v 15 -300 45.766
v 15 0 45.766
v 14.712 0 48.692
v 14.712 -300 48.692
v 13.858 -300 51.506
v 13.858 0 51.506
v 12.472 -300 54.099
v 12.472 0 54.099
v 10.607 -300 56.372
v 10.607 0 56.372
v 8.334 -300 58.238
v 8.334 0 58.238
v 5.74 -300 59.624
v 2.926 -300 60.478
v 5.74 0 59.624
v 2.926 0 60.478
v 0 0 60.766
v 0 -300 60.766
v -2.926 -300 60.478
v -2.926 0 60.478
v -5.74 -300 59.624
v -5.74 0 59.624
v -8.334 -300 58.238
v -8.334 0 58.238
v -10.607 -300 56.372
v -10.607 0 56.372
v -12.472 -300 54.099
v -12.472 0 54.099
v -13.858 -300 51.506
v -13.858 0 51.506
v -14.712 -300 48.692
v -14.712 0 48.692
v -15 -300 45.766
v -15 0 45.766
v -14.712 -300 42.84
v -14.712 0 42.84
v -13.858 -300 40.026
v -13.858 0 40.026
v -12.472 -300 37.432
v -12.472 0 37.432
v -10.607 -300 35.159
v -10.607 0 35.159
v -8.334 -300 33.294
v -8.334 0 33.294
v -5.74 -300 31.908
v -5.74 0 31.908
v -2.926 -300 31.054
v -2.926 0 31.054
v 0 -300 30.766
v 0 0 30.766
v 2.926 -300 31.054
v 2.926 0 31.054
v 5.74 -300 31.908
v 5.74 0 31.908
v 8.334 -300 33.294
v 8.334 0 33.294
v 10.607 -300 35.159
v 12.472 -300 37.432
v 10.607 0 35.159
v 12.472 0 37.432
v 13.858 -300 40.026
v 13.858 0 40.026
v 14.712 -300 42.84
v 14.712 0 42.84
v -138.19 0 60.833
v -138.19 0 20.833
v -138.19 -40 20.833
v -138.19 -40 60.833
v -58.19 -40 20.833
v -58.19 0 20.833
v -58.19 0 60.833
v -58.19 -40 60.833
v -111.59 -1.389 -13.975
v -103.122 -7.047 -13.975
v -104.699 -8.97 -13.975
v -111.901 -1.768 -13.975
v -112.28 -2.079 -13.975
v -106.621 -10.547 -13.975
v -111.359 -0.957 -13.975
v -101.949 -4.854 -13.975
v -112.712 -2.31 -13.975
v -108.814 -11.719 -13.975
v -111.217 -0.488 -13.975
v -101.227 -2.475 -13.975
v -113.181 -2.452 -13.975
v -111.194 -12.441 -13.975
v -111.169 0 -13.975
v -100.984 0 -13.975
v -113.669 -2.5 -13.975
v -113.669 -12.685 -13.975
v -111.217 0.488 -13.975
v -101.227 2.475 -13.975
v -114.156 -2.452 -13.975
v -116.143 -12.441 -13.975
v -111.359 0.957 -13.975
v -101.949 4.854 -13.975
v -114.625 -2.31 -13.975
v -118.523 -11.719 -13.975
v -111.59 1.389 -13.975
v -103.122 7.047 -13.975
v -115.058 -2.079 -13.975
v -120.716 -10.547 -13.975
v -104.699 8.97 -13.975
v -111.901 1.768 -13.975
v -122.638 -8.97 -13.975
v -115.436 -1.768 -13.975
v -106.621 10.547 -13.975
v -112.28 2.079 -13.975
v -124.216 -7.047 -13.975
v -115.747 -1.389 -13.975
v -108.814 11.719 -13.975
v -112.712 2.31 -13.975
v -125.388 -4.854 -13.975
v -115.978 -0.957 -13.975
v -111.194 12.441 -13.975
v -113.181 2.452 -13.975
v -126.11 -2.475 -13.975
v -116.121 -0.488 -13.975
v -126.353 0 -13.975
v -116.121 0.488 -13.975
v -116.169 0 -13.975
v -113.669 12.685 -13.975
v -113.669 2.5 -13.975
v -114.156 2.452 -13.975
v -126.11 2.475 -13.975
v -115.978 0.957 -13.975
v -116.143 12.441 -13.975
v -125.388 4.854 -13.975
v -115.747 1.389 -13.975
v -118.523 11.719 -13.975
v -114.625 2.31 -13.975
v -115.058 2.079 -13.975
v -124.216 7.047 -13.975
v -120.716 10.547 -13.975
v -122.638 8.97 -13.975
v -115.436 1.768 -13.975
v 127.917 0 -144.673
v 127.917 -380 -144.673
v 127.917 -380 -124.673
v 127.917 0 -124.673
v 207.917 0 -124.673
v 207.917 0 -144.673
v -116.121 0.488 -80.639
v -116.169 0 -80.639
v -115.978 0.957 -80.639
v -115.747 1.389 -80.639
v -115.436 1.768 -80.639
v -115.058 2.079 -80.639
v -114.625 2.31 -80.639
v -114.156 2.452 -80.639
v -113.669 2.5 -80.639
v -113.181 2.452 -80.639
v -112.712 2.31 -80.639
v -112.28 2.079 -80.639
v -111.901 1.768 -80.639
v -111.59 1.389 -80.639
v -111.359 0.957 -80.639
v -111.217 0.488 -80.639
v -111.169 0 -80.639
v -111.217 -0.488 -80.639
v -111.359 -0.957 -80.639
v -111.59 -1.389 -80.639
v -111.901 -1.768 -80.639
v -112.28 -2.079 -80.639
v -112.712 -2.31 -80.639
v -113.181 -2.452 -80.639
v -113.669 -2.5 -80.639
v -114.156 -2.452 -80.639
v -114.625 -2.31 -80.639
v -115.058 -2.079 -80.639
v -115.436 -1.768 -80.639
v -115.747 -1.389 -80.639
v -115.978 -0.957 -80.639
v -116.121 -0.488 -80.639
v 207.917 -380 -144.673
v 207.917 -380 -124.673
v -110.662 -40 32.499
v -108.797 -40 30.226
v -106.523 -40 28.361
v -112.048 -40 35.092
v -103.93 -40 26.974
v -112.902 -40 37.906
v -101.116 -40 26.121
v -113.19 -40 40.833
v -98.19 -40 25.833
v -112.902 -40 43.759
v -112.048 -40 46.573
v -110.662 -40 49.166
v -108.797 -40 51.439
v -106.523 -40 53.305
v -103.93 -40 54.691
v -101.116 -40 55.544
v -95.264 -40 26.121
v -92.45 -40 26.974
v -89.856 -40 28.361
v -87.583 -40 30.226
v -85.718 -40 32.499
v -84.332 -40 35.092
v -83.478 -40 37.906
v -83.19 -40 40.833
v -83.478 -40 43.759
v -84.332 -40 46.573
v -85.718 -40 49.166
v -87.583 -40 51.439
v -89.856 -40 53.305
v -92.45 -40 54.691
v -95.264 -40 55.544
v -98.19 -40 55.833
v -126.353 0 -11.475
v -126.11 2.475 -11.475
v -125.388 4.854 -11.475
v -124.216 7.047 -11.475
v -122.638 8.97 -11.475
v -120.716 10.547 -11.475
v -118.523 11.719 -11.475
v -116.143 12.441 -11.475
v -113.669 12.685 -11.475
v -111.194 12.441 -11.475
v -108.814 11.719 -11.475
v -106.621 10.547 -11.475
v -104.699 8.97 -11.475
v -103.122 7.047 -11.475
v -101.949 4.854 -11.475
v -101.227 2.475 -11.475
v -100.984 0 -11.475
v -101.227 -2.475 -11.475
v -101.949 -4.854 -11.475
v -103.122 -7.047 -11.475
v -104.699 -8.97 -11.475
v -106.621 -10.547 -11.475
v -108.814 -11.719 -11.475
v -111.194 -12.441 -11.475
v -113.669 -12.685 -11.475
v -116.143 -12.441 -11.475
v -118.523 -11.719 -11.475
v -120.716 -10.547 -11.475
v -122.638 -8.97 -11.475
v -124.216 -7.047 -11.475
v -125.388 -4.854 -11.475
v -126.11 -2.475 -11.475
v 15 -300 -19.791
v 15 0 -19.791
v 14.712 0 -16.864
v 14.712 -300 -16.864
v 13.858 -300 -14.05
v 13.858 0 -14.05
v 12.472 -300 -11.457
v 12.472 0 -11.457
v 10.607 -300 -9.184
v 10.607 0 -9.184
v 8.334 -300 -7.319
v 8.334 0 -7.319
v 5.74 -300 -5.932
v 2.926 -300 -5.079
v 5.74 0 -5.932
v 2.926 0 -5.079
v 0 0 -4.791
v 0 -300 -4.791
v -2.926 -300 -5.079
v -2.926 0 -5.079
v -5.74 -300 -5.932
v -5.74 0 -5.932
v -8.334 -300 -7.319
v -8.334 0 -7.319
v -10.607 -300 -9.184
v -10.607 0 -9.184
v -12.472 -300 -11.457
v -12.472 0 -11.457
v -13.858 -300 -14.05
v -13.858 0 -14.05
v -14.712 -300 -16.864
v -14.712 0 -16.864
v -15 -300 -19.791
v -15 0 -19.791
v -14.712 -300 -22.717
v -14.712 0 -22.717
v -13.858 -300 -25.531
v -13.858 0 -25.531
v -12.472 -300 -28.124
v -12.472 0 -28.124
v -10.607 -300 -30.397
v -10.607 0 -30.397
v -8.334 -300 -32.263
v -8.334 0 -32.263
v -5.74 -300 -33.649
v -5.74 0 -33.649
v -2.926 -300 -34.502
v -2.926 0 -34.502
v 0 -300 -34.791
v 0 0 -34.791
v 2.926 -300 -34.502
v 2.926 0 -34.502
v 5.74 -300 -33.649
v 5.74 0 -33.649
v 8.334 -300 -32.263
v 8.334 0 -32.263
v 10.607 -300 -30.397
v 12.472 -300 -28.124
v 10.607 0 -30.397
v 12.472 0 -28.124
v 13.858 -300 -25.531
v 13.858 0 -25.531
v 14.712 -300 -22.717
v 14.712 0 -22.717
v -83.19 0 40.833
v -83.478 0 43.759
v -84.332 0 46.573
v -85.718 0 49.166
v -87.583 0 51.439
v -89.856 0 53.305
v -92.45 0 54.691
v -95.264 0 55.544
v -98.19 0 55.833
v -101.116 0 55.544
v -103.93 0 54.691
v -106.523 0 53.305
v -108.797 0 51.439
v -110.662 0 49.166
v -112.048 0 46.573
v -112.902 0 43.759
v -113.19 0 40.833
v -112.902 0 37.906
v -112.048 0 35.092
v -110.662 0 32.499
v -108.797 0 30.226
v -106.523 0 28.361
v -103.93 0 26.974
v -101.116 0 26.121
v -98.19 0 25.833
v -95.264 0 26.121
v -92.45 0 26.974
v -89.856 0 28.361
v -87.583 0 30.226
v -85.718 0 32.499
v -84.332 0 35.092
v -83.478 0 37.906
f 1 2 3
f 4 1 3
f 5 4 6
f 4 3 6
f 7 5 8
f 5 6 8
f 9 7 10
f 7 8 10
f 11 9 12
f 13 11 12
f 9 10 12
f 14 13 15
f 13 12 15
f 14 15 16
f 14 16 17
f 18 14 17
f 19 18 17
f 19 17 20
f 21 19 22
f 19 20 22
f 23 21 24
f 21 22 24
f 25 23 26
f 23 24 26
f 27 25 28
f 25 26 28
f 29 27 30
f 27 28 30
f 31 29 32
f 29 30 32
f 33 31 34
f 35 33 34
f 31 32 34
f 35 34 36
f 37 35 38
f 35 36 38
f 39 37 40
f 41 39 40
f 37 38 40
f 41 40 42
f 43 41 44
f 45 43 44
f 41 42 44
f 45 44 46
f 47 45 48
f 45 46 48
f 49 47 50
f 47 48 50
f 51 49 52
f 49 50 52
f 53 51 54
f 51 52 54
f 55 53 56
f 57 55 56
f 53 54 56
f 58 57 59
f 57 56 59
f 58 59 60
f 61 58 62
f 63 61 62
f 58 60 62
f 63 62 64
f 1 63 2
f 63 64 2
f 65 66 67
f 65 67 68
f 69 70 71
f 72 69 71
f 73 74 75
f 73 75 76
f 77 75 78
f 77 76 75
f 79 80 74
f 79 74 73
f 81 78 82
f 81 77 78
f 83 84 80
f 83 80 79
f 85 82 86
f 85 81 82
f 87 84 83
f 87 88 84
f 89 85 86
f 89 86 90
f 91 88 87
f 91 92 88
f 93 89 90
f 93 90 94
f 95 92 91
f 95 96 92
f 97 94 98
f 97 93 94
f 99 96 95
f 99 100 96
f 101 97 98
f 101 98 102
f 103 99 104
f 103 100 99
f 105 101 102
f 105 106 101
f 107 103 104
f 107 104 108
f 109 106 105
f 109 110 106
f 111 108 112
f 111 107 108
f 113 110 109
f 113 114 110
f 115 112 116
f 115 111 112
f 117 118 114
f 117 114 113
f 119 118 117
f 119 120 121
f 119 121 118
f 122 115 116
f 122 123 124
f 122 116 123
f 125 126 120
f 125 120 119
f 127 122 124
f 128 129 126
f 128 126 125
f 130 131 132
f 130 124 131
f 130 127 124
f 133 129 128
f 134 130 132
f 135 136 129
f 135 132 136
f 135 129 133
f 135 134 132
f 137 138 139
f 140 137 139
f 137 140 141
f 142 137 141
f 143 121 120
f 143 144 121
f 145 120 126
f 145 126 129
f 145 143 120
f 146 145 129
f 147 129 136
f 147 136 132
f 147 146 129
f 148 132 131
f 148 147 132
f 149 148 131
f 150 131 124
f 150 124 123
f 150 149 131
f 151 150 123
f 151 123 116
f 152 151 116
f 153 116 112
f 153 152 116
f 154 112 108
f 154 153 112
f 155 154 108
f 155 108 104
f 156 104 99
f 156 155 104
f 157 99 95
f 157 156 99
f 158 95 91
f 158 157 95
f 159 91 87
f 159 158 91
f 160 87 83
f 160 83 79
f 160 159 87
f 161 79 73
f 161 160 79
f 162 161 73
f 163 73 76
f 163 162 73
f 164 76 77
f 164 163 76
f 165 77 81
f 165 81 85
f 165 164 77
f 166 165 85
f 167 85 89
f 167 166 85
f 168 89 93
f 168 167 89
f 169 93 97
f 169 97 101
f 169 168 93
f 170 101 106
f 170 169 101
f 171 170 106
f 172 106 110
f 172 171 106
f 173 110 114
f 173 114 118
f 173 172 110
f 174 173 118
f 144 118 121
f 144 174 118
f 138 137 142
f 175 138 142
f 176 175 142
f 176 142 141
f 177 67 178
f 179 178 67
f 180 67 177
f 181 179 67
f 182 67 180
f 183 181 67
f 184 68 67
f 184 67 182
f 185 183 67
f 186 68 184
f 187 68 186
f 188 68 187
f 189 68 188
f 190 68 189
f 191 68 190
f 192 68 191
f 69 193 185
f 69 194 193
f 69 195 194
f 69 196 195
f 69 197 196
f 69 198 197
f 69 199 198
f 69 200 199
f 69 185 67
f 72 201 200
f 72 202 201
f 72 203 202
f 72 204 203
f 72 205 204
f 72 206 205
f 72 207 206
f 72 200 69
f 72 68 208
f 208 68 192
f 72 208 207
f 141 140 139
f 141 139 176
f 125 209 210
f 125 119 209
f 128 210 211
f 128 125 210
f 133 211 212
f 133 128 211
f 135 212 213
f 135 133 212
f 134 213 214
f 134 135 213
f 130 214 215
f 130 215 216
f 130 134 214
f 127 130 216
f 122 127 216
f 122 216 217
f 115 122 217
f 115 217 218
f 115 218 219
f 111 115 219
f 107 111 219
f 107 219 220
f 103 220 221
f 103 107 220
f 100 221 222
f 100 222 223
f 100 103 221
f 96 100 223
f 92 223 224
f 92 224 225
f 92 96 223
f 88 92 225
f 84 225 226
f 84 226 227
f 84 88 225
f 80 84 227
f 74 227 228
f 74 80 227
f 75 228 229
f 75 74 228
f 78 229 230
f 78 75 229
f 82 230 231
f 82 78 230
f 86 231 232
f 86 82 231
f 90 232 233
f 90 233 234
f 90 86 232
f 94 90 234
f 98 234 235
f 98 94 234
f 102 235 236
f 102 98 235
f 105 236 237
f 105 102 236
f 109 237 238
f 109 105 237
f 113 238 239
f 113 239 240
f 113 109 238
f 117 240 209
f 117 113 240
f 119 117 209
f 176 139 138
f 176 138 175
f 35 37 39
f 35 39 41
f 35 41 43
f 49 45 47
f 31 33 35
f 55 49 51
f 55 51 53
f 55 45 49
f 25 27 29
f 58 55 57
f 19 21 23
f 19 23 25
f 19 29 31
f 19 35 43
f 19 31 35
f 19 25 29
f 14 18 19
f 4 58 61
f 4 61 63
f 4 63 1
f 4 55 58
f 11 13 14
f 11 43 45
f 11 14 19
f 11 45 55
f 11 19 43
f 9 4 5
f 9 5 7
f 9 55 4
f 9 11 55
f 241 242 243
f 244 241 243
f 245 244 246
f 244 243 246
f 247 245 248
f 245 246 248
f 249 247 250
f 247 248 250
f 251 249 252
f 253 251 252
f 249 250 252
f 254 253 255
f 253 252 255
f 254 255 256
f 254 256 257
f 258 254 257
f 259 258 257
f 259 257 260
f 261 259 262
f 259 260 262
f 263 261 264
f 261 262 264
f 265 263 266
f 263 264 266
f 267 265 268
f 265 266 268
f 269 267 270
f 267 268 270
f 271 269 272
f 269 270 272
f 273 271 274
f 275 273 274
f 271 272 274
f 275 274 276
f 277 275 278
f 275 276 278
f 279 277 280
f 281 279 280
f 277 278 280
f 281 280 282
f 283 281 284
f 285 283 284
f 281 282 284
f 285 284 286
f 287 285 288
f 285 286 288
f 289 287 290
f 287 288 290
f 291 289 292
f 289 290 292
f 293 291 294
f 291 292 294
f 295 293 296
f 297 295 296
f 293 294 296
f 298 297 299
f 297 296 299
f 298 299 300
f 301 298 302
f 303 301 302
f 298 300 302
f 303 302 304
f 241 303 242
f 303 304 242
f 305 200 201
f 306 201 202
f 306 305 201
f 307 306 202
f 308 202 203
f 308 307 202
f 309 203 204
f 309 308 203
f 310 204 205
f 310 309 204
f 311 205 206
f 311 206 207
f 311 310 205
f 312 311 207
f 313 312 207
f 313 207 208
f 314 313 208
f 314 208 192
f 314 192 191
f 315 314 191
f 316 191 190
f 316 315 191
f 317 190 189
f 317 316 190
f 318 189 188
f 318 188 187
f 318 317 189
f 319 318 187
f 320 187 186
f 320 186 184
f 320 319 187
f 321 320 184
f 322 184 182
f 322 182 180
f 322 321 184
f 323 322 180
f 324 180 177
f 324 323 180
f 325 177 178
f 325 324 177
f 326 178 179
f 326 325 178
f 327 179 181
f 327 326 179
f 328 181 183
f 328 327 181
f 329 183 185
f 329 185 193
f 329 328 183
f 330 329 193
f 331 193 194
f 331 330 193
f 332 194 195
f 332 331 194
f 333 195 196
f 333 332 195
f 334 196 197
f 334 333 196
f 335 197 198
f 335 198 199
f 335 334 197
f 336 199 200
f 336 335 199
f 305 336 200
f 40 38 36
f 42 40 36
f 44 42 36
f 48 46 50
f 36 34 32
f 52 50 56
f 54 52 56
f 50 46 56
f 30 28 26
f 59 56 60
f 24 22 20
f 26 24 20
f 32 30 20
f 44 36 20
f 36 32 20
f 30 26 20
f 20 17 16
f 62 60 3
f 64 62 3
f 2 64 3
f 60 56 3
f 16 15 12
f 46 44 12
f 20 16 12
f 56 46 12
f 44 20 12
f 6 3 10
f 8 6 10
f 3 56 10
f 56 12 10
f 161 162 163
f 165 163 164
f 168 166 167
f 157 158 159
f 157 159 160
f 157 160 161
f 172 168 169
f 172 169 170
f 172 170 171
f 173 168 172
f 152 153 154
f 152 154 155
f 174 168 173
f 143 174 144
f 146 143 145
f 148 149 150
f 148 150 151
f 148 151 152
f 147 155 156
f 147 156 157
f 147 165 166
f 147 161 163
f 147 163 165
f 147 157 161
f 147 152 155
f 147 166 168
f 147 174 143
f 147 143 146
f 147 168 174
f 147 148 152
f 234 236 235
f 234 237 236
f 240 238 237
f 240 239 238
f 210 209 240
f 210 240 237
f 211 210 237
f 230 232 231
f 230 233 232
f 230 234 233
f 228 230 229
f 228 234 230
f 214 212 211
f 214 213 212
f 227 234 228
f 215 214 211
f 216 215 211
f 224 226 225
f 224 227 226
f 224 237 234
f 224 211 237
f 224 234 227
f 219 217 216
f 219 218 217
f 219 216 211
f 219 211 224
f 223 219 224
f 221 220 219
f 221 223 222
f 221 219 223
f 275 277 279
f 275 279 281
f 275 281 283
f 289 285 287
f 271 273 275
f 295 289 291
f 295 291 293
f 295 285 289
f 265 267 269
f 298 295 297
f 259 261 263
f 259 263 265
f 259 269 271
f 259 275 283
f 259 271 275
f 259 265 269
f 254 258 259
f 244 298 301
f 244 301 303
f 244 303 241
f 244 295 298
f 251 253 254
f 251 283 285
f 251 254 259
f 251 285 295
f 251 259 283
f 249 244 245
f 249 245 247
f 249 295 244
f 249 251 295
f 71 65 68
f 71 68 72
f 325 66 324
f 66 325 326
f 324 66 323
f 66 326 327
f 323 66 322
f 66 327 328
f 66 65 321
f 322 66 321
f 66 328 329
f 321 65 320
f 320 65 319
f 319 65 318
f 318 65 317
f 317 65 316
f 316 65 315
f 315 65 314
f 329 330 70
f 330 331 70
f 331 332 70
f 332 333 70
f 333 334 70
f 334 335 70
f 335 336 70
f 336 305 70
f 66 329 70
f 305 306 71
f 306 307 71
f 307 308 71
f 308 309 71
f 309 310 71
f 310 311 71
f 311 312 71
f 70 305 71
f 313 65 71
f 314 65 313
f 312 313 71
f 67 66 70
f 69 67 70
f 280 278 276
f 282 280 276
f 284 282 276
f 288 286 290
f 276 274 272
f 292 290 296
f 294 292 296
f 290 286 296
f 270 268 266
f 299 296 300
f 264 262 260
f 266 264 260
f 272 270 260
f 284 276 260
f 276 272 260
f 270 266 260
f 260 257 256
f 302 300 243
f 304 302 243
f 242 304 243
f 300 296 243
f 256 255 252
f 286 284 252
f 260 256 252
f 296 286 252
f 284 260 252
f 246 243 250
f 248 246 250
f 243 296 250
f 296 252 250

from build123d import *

# Parameters (mm, degrees)
F0_W     = 80
F0_H     = 40
F0_R     = 15
F1_DEPTH = 40
F2_DEPTH = 300
F0_H_2   = 20
F4_DEPTH = 380


with BuildPart() as f1:
    # F0 (on Front) → F1 (new body)
    with BuildSketch(Plane.XZ):
        with Locations((-98.189927, 40.832652)):
            Rectangle(F0_W, F0_H)
        with Locations((-98.189927, 40.832652)):
            Circle(F0_R, mode=Mode.SUBTRACT)
    extrude(amount=F1_DEPTH)


with BuildPart() as f2:
    # F0 (on Front) → F2 (new body)
    with BuildSketch(Plane.XZ):
        with Locations((0, 45.765889)):
            Circle(F0_R)
        with Locations((0, -19.790656)):
            Circle(F0_R)
    extrude(amount=F2_DEPTH)


with BuildPart() as f3:
    # F0 (on Front) → F3 (revolve)
    with BuildSketch(Plane.XZ):
        Polygon((-113.668603, -80.639288), (-113.668603, -11.474801), (-126.353458, -11.474801), (-126.353458, -13.974801), (-116.168603, -13.974801), (-116.168603, -80.639288), align=None)
    revolve(axis=Axis((-113.668603, 0, -46.057044), (0, 0, -1)))


with BuildPart() as f4:
    # F0 (on Front) → F4 (new body)
    with BuildSketch(Plane.XZ):
        with Locations((167.916649, -134.673288)):
            Rectangle(F0_W, F0_H_2)
    extrude(amount=F4_DEPTH)


solid = Compound([f1.part, f2.part, f3.part, f4.part])
